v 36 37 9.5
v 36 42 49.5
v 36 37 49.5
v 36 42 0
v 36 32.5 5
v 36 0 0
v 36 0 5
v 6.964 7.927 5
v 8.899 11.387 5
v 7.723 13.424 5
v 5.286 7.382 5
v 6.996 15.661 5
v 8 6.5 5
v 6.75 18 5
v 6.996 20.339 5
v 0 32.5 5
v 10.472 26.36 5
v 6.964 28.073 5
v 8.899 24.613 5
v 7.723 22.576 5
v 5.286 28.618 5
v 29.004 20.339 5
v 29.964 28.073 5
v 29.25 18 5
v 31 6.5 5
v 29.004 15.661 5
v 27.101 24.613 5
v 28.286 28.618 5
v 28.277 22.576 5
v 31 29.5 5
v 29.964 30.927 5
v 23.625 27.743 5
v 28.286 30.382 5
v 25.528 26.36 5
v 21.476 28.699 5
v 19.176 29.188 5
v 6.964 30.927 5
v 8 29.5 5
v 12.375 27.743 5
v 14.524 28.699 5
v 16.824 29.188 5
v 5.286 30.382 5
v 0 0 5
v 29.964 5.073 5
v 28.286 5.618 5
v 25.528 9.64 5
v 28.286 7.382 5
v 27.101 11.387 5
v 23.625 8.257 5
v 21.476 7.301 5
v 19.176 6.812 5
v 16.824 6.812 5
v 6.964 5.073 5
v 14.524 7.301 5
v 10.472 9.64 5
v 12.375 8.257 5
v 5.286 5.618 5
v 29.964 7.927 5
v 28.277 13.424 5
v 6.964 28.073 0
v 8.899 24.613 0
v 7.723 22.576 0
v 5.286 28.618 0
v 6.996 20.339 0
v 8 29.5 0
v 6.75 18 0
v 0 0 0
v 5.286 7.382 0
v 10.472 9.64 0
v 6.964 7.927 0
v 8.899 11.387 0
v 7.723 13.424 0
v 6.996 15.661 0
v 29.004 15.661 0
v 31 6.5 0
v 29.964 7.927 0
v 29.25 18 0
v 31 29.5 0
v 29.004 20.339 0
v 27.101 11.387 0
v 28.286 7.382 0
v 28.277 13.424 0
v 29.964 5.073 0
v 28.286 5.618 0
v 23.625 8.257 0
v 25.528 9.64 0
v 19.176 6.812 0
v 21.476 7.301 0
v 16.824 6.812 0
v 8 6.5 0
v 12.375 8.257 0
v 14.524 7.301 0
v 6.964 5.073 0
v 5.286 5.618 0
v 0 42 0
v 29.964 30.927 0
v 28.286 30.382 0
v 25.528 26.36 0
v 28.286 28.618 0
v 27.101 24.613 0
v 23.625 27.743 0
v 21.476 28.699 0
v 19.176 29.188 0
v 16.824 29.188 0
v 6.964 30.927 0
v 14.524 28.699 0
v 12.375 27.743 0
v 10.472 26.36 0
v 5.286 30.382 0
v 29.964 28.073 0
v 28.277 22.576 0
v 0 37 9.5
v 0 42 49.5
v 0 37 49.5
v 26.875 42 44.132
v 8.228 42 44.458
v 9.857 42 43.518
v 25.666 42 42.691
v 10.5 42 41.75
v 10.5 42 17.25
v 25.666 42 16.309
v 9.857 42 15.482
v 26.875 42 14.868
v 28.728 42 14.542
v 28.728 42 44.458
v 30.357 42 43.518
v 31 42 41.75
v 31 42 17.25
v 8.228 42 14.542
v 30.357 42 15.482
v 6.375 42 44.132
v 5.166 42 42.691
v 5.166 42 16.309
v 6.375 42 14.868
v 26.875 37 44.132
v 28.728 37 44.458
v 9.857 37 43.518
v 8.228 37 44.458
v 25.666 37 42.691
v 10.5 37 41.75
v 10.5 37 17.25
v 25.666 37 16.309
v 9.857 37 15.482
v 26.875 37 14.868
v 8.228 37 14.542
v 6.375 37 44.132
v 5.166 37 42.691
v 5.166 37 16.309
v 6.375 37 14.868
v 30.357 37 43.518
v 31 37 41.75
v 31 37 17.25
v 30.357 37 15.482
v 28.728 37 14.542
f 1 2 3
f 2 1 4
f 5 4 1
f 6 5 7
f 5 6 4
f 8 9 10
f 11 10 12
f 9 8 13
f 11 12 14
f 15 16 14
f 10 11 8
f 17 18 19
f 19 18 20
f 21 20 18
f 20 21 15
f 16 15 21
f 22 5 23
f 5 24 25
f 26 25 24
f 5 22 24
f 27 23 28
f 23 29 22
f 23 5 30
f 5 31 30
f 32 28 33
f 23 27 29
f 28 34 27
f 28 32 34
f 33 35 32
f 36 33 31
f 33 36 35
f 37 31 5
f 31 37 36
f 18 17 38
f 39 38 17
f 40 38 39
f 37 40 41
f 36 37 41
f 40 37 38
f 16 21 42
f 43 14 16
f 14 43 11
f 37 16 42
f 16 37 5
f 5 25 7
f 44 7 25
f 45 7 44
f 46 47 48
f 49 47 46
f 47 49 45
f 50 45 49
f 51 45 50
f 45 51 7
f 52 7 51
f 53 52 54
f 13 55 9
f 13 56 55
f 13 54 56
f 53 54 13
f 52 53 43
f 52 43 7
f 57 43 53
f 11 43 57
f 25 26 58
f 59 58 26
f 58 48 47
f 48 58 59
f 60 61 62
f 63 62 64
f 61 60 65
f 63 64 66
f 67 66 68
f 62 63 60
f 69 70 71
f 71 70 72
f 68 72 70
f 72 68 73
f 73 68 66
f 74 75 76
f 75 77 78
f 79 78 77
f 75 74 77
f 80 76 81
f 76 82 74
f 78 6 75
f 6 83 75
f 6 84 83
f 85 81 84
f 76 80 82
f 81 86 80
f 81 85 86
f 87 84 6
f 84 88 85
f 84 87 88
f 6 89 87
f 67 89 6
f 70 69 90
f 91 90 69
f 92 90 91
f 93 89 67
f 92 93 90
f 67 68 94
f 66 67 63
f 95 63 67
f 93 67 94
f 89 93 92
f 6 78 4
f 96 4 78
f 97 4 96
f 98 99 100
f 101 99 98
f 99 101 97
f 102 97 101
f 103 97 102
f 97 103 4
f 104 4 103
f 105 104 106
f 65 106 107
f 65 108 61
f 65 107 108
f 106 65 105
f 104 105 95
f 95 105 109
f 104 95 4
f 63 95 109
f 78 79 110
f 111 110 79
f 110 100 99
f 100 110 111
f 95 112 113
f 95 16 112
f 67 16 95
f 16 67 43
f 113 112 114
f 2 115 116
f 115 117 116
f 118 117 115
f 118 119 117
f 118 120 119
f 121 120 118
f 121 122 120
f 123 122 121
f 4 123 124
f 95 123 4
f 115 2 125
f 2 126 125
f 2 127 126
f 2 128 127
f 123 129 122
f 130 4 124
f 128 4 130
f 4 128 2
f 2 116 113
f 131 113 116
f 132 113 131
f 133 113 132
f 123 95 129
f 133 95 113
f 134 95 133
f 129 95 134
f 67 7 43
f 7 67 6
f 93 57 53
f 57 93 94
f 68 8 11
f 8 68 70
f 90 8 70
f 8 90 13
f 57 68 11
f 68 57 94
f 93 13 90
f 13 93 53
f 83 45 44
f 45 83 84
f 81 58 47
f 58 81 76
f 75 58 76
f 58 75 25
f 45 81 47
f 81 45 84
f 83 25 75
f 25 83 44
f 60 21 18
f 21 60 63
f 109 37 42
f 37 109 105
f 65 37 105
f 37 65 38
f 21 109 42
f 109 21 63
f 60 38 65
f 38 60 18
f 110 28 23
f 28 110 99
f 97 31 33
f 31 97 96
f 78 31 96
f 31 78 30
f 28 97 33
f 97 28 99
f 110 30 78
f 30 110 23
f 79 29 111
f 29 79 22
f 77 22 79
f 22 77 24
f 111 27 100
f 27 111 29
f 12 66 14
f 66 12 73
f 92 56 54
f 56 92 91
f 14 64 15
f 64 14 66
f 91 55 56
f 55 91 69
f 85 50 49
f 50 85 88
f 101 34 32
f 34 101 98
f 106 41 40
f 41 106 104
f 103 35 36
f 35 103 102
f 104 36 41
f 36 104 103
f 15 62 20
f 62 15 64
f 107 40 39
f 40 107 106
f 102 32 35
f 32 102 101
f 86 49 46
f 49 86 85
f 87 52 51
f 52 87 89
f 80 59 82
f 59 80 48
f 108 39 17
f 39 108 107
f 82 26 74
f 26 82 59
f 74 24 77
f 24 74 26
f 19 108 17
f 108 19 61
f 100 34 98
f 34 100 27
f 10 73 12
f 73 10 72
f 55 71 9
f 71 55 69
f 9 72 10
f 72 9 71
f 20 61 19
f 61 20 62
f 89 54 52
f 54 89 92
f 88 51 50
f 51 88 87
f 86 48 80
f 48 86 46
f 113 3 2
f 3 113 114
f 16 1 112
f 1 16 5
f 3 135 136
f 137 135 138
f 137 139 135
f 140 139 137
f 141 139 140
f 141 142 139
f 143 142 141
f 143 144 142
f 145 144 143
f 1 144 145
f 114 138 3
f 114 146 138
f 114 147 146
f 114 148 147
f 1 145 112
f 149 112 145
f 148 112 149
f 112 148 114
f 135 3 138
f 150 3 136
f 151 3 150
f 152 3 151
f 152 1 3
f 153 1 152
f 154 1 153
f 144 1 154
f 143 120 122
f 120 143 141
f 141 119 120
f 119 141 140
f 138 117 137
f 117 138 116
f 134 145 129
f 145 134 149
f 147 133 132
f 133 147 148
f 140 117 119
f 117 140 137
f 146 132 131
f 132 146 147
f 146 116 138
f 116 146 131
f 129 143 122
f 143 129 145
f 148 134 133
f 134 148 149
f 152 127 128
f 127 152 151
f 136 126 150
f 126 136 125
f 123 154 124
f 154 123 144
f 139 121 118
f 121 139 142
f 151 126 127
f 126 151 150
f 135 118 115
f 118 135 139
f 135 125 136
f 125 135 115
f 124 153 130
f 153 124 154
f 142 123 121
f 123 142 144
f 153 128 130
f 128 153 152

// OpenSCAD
// Uncomment before final render
//$fa = 0.01;
//$fs = 0.25;

module cAxisMotorMount() {
  union() {
    difference() {
      cube([36, 42, 5]);
      translate([6.5, 6.5, -1]) {
        cylinder(7, 1.5, 1.5);
      }
      translate([29.5, 6.5, -1]) {
        cylinder(7, 1.5, 1.5);
      }
      translate([6.5, 29.5, -1]) {
        cylinder(7, 1.5, 1.5);
      }
      translate([29.5, 29.5, -1]) {
        cylinder(7, 1.5, 1.5);
      }
      translate([18, 18, -1]) {
        cylinder(7, 11.25, 11.25);
      }
    }
    translate([0, 32.5, 5]) {
      difference() {
        cube([36, 9.5, 44.5]);
        translate([-1, 0, 0]) {
          rotate([45, 0, 0]) {
            cube([38, sqrt(40.5), sqrt(40.5)]);
          }
        }
        translate([-1, -1, 4.5]) {
          cube([38, 5.5, 41]);
        }
        hull() {
          translate([7.75, 3.5, 12.25]) {
            rotate([-90, 0, 0]) {
              cylinder(7, 2.75, 2.75);
            }
          }
          translate([7.75, 3.5, 36.75]) {
            rotate([-90, 0, 0]) {
              cylinder(7, 2.75, 2.75);
            }
          }
        }
        hull() {
          translate([28.25, 3.5, 12.25]) {
            rotate([-90, 0, 0]) {
              cylinder(7, 2.75, 2.75);
            }
          }
          translate([28.25, 3.5, 36.75]) {
            rotate([-90, 0, 0]) {
              cylinder(7, 2.75, 2.75);
            }
          }
        }
      }
    }
  }
}

cAxisMotorMount();
